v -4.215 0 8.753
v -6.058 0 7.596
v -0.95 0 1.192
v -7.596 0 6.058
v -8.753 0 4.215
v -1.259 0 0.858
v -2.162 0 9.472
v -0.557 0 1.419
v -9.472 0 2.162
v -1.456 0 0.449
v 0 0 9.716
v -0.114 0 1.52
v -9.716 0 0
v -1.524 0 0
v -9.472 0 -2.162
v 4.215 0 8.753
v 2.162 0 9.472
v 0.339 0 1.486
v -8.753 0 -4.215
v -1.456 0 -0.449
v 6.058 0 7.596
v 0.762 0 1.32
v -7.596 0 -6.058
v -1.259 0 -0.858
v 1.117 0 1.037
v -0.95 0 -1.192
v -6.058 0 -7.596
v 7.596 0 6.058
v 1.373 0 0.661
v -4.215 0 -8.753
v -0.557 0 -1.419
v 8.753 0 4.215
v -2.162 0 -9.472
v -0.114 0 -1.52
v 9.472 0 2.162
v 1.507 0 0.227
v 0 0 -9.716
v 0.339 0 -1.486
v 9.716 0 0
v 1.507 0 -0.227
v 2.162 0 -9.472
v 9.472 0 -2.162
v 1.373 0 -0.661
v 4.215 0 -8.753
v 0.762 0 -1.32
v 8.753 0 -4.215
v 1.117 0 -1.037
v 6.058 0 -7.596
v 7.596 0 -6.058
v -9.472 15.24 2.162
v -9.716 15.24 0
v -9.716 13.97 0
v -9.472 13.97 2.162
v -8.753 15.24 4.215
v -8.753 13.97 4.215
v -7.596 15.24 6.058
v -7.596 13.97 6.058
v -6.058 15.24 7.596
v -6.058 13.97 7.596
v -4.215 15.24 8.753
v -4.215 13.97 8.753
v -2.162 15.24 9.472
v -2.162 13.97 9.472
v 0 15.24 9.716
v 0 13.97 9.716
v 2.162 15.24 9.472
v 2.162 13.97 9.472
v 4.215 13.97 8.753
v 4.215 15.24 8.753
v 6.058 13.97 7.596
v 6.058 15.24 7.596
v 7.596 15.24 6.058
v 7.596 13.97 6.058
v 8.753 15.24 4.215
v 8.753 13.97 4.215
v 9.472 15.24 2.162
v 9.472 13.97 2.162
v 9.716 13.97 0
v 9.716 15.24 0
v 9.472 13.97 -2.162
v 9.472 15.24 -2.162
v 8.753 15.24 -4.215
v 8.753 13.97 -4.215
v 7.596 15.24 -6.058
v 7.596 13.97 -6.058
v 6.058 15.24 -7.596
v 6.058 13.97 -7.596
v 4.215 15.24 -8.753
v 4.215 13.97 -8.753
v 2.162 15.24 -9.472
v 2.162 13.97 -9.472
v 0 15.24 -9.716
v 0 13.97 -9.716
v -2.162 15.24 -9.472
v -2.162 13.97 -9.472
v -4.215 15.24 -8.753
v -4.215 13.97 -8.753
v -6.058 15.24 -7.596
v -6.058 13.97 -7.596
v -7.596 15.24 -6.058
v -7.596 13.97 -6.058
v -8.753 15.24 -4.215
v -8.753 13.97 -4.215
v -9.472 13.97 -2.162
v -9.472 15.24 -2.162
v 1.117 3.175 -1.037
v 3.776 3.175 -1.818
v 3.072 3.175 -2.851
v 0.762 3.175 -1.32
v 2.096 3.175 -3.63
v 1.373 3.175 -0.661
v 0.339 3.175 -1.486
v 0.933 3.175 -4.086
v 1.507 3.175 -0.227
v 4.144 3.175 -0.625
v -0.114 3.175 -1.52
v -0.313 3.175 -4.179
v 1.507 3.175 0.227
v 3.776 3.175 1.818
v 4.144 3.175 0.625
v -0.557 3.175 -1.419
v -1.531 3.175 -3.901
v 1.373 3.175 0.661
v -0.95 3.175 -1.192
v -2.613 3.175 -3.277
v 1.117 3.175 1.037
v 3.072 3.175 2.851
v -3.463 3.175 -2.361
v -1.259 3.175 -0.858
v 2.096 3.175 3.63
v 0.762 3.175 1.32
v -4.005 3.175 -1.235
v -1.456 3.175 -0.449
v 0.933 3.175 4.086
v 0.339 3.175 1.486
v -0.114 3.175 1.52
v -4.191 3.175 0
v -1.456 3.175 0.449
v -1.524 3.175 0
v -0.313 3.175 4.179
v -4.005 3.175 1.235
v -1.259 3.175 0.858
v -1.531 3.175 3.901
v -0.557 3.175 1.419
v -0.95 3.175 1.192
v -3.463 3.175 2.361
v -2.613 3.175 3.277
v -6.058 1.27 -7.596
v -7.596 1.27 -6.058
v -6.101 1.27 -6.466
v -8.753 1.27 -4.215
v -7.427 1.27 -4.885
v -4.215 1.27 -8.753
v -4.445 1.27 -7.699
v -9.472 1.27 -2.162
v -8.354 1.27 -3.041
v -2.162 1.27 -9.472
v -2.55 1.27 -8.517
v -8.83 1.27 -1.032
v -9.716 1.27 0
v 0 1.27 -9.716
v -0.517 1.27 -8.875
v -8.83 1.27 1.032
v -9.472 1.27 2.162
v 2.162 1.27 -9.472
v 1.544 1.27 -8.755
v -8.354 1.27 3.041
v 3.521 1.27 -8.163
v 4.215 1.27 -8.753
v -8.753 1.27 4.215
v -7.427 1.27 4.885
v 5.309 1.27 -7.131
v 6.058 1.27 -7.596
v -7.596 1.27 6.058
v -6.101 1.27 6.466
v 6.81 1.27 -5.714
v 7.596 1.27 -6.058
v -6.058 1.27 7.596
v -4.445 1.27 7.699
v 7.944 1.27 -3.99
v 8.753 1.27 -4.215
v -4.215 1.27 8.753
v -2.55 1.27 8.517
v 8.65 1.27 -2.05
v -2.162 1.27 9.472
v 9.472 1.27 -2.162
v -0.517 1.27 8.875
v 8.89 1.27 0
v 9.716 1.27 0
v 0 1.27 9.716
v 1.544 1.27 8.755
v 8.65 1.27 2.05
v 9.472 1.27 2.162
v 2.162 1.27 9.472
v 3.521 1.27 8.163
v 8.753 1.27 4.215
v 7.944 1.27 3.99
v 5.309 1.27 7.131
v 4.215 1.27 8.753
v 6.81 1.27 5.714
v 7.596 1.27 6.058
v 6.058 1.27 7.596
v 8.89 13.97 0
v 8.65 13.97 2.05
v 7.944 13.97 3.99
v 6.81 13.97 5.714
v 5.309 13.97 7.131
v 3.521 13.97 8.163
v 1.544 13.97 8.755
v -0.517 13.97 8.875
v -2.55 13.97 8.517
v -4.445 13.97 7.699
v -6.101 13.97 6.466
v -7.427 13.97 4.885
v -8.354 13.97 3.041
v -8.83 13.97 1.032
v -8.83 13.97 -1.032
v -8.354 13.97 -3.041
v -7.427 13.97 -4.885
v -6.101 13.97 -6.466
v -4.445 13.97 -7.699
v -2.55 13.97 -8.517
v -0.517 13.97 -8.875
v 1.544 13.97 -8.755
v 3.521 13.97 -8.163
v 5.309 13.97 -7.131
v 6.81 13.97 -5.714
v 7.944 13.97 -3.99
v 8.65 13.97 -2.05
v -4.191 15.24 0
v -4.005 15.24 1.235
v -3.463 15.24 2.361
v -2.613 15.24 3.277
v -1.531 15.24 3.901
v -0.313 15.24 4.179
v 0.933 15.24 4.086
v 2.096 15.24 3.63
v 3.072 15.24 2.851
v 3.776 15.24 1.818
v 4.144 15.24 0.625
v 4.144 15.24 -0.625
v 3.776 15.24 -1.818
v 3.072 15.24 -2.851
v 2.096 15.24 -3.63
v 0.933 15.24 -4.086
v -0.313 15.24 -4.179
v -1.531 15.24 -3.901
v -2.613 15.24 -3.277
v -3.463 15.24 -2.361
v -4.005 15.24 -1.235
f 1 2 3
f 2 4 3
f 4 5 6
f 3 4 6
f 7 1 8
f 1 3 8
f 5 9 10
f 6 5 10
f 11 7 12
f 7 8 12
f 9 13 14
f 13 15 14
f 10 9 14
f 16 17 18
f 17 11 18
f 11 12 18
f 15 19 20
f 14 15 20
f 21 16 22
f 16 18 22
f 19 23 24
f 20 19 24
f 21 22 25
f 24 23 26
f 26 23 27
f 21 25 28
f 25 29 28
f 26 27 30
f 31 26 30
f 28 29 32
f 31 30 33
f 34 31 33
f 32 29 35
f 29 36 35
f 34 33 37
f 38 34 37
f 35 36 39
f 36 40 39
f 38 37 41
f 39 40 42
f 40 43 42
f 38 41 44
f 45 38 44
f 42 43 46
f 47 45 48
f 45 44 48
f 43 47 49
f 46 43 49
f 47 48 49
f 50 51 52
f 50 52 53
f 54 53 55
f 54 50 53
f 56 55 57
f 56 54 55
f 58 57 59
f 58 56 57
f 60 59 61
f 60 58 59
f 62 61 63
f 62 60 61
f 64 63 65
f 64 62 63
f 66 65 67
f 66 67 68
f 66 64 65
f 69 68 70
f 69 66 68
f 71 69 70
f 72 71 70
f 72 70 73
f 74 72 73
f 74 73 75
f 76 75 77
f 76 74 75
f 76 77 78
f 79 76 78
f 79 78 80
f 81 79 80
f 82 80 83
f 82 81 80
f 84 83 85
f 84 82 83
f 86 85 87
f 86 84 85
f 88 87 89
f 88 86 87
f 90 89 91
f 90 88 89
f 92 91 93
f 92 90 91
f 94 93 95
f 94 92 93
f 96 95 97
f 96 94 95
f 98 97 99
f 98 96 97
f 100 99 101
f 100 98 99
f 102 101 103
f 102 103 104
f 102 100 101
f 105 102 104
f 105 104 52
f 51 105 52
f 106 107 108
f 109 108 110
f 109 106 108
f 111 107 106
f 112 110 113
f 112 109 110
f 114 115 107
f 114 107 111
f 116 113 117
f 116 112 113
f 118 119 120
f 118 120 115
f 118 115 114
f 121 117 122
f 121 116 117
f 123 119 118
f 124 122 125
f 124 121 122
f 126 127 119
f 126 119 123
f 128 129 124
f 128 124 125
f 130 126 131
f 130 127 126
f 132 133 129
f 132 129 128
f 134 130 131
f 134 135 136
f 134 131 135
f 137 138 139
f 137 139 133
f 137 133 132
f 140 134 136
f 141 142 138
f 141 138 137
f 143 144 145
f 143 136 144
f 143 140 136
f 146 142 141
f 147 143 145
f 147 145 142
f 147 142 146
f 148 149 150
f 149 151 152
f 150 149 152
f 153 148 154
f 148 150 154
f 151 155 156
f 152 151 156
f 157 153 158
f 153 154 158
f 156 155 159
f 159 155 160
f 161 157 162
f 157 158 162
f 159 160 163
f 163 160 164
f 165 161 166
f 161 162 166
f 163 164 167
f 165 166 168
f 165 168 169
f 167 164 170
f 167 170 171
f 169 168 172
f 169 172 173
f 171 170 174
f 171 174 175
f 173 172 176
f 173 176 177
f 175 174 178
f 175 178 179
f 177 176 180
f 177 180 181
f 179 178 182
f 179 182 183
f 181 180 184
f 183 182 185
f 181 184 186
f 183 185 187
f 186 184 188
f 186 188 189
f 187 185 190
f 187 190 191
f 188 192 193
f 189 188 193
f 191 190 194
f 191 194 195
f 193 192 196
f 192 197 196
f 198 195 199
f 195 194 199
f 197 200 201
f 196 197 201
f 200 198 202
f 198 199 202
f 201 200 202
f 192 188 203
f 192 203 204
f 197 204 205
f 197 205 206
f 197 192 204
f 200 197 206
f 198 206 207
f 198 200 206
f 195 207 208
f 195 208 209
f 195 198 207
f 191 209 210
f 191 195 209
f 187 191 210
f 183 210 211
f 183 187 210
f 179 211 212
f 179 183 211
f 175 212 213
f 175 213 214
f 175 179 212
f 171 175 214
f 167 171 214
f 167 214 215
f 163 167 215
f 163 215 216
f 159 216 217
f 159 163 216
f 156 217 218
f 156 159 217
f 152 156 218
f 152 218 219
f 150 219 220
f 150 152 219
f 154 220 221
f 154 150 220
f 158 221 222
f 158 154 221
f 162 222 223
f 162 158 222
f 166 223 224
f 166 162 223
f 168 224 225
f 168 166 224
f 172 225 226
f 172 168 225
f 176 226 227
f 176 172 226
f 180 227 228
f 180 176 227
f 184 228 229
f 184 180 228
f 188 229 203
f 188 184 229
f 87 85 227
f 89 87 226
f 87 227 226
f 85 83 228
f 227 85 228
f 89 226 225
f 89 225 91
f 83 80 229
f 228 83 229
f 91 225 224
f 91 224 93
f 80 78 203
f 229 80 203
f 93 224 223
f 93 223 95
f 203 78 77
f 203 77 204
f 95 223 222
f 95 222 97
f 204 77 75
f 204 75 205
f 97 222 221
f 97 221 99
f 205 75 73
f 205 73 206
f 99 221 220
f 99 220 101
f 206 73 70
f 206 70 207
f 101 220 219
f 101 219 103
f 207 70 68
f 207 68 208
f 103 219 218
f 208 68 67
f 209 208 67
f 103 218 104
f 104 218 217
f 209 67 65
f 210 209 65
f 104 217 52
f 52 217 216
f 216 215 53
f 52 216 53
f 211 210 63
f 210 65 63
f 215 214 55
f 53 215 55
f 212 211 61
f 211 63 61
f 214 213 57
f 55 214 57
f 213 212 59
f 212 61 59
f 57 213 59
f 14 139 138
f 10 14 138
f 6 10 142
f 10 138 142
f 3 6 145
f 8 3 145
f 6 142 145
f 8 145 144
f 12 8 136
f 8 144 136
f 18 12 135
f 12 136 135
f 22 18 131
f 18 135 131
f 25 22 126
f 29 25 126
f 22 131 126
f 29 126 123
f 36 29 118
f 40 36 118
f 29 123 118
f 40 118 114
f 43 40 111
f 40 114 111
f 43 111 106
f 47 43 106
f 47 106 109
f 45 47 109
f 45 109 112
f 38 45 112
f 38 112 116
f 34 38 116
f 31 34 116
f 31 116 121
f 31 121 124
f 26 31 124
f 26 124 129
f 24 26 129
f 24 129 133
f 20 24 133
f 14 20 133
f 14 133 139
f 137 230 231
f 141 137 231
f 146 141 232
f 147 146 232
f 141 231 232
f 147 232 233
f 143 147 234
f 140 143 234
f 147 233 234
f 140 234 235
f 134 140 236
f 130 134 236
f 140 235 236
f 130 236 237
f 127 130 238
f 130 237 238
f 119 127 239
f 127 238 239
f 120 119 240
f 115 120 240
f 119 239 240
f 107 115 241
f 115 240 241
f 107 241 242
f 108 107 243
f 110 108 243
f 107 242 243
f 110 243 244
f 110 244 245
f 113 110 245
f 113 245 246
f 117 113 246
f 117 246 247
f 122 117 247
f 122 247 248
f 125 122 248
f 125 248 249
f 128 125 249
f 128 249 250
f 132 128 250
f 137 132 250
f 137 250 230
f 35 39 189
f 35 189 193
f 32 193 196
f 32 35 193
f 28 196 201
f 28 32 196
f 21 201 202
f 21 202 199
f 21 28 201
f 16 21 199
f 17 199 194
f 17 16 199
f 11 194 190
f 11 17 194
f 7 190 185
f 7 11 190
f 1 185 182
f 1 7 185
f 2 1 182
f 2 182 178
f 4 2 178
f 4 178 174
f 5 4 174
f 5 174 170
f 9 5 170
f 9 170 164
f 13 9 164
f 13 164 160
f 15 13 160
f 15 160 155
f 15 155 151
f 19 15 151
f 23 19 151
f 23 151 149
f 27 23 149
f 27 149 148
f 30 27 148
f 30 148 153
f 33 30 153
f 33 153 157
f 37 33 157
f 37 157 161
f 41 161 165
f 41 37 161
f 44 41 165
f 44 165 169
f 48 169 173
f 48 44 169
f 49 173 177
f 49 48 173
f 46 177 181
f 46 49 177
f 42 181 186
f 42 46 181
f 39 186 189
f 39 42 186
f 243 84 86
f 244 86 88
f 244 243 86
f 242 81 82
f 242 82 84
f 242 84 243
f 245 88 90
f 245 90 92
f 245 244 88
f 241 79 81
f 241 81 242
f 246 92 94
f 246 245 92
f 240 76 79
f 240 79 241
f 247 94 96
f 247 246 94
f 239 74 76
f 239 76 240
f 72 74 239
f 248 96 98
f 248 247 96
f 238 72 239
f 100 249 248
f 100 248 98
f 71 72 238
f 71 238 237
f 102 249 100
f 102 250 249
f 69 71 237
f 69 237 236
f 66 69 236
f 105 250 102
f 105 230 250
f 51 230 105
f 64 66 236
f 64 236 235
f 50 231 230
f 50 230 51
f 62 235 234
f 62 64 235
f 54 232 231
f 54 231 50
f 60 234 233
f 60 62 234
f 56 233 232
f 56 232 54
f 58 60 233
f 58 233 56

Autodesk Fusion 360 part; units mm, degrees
sketch "Hub" plane through (0, 0, 0) normal (0, 1, 0) x (1, 0, 0)
  circle A0 centre (0, 0) radius 8.89
  dimension "d8" = 17.78
extrude "Extrude1" add sketch "Hub" along normal blind 15.24
sketch "Inner Cap" plane through (0, 0, 0) normal (0, -1, 0) x (1, 0, 0)
  circle A0 centre (0, 0) radius 8.89
  circle A1 centre (0, 0) radius 9.7155
  dimension "d11" = 19.431
extrude "Extrude2" add sketch "Inner Cap" against normal blind 1.27 contours A0 | A1
sketch "Outer Cap" plane through (0, 15.24, 0) normal (0, 1, 0) x (-1, 0, 0)
  circle A0 centre (0, 0) radius 8.89
  circle A1 centre (0, 0) radius 9.7155
  circle A2 centre (0, 0) radius 9.7155
  circle A3 centre (0, 0) radius 9.7155
extrude "Extrude3" add sketch "Outer Cap" against normal blind 1.27 contours A0 | A1 A2 A3
sketch "Bore" plane through (0, 15.24, 0) normal (0, 1, 0) x (-1, 0, 0)
  circle A0 centre (0, 0) radius 9.7155
  circle A1 centre (0, 0) radius 4.191
  dimension "d16" = 8.382
extrude "Extrude4" cut sketch "Bore" against normal blind 12.065 contours A1
sketch "Screw Hole" plane through (0, 15.24, 0) normal (0, 1, 0) x (-1, 0, 0)
  circle A0 centre (0, 0) radius 1.524
  dimension "d19" = 3.048
extrude "Extrude5" cut sketch "Screw Hole" against normal blind 72.644
equation "hubDia = 0.7 in"
equation "boreDia = 0.33 in"
equation "boreDepth = 0.475 in"
equation "screwHole = 0.12 in"
equation "capEndDia = 0.765 in"
equation "capThickness = 0.05 in"
equation "d8 = hubDia"
equation "d11 = capEndDia"
equation "d16 = boreDia"
equation "d17 = -boreDepth"
equation "d19 = screwHole"
